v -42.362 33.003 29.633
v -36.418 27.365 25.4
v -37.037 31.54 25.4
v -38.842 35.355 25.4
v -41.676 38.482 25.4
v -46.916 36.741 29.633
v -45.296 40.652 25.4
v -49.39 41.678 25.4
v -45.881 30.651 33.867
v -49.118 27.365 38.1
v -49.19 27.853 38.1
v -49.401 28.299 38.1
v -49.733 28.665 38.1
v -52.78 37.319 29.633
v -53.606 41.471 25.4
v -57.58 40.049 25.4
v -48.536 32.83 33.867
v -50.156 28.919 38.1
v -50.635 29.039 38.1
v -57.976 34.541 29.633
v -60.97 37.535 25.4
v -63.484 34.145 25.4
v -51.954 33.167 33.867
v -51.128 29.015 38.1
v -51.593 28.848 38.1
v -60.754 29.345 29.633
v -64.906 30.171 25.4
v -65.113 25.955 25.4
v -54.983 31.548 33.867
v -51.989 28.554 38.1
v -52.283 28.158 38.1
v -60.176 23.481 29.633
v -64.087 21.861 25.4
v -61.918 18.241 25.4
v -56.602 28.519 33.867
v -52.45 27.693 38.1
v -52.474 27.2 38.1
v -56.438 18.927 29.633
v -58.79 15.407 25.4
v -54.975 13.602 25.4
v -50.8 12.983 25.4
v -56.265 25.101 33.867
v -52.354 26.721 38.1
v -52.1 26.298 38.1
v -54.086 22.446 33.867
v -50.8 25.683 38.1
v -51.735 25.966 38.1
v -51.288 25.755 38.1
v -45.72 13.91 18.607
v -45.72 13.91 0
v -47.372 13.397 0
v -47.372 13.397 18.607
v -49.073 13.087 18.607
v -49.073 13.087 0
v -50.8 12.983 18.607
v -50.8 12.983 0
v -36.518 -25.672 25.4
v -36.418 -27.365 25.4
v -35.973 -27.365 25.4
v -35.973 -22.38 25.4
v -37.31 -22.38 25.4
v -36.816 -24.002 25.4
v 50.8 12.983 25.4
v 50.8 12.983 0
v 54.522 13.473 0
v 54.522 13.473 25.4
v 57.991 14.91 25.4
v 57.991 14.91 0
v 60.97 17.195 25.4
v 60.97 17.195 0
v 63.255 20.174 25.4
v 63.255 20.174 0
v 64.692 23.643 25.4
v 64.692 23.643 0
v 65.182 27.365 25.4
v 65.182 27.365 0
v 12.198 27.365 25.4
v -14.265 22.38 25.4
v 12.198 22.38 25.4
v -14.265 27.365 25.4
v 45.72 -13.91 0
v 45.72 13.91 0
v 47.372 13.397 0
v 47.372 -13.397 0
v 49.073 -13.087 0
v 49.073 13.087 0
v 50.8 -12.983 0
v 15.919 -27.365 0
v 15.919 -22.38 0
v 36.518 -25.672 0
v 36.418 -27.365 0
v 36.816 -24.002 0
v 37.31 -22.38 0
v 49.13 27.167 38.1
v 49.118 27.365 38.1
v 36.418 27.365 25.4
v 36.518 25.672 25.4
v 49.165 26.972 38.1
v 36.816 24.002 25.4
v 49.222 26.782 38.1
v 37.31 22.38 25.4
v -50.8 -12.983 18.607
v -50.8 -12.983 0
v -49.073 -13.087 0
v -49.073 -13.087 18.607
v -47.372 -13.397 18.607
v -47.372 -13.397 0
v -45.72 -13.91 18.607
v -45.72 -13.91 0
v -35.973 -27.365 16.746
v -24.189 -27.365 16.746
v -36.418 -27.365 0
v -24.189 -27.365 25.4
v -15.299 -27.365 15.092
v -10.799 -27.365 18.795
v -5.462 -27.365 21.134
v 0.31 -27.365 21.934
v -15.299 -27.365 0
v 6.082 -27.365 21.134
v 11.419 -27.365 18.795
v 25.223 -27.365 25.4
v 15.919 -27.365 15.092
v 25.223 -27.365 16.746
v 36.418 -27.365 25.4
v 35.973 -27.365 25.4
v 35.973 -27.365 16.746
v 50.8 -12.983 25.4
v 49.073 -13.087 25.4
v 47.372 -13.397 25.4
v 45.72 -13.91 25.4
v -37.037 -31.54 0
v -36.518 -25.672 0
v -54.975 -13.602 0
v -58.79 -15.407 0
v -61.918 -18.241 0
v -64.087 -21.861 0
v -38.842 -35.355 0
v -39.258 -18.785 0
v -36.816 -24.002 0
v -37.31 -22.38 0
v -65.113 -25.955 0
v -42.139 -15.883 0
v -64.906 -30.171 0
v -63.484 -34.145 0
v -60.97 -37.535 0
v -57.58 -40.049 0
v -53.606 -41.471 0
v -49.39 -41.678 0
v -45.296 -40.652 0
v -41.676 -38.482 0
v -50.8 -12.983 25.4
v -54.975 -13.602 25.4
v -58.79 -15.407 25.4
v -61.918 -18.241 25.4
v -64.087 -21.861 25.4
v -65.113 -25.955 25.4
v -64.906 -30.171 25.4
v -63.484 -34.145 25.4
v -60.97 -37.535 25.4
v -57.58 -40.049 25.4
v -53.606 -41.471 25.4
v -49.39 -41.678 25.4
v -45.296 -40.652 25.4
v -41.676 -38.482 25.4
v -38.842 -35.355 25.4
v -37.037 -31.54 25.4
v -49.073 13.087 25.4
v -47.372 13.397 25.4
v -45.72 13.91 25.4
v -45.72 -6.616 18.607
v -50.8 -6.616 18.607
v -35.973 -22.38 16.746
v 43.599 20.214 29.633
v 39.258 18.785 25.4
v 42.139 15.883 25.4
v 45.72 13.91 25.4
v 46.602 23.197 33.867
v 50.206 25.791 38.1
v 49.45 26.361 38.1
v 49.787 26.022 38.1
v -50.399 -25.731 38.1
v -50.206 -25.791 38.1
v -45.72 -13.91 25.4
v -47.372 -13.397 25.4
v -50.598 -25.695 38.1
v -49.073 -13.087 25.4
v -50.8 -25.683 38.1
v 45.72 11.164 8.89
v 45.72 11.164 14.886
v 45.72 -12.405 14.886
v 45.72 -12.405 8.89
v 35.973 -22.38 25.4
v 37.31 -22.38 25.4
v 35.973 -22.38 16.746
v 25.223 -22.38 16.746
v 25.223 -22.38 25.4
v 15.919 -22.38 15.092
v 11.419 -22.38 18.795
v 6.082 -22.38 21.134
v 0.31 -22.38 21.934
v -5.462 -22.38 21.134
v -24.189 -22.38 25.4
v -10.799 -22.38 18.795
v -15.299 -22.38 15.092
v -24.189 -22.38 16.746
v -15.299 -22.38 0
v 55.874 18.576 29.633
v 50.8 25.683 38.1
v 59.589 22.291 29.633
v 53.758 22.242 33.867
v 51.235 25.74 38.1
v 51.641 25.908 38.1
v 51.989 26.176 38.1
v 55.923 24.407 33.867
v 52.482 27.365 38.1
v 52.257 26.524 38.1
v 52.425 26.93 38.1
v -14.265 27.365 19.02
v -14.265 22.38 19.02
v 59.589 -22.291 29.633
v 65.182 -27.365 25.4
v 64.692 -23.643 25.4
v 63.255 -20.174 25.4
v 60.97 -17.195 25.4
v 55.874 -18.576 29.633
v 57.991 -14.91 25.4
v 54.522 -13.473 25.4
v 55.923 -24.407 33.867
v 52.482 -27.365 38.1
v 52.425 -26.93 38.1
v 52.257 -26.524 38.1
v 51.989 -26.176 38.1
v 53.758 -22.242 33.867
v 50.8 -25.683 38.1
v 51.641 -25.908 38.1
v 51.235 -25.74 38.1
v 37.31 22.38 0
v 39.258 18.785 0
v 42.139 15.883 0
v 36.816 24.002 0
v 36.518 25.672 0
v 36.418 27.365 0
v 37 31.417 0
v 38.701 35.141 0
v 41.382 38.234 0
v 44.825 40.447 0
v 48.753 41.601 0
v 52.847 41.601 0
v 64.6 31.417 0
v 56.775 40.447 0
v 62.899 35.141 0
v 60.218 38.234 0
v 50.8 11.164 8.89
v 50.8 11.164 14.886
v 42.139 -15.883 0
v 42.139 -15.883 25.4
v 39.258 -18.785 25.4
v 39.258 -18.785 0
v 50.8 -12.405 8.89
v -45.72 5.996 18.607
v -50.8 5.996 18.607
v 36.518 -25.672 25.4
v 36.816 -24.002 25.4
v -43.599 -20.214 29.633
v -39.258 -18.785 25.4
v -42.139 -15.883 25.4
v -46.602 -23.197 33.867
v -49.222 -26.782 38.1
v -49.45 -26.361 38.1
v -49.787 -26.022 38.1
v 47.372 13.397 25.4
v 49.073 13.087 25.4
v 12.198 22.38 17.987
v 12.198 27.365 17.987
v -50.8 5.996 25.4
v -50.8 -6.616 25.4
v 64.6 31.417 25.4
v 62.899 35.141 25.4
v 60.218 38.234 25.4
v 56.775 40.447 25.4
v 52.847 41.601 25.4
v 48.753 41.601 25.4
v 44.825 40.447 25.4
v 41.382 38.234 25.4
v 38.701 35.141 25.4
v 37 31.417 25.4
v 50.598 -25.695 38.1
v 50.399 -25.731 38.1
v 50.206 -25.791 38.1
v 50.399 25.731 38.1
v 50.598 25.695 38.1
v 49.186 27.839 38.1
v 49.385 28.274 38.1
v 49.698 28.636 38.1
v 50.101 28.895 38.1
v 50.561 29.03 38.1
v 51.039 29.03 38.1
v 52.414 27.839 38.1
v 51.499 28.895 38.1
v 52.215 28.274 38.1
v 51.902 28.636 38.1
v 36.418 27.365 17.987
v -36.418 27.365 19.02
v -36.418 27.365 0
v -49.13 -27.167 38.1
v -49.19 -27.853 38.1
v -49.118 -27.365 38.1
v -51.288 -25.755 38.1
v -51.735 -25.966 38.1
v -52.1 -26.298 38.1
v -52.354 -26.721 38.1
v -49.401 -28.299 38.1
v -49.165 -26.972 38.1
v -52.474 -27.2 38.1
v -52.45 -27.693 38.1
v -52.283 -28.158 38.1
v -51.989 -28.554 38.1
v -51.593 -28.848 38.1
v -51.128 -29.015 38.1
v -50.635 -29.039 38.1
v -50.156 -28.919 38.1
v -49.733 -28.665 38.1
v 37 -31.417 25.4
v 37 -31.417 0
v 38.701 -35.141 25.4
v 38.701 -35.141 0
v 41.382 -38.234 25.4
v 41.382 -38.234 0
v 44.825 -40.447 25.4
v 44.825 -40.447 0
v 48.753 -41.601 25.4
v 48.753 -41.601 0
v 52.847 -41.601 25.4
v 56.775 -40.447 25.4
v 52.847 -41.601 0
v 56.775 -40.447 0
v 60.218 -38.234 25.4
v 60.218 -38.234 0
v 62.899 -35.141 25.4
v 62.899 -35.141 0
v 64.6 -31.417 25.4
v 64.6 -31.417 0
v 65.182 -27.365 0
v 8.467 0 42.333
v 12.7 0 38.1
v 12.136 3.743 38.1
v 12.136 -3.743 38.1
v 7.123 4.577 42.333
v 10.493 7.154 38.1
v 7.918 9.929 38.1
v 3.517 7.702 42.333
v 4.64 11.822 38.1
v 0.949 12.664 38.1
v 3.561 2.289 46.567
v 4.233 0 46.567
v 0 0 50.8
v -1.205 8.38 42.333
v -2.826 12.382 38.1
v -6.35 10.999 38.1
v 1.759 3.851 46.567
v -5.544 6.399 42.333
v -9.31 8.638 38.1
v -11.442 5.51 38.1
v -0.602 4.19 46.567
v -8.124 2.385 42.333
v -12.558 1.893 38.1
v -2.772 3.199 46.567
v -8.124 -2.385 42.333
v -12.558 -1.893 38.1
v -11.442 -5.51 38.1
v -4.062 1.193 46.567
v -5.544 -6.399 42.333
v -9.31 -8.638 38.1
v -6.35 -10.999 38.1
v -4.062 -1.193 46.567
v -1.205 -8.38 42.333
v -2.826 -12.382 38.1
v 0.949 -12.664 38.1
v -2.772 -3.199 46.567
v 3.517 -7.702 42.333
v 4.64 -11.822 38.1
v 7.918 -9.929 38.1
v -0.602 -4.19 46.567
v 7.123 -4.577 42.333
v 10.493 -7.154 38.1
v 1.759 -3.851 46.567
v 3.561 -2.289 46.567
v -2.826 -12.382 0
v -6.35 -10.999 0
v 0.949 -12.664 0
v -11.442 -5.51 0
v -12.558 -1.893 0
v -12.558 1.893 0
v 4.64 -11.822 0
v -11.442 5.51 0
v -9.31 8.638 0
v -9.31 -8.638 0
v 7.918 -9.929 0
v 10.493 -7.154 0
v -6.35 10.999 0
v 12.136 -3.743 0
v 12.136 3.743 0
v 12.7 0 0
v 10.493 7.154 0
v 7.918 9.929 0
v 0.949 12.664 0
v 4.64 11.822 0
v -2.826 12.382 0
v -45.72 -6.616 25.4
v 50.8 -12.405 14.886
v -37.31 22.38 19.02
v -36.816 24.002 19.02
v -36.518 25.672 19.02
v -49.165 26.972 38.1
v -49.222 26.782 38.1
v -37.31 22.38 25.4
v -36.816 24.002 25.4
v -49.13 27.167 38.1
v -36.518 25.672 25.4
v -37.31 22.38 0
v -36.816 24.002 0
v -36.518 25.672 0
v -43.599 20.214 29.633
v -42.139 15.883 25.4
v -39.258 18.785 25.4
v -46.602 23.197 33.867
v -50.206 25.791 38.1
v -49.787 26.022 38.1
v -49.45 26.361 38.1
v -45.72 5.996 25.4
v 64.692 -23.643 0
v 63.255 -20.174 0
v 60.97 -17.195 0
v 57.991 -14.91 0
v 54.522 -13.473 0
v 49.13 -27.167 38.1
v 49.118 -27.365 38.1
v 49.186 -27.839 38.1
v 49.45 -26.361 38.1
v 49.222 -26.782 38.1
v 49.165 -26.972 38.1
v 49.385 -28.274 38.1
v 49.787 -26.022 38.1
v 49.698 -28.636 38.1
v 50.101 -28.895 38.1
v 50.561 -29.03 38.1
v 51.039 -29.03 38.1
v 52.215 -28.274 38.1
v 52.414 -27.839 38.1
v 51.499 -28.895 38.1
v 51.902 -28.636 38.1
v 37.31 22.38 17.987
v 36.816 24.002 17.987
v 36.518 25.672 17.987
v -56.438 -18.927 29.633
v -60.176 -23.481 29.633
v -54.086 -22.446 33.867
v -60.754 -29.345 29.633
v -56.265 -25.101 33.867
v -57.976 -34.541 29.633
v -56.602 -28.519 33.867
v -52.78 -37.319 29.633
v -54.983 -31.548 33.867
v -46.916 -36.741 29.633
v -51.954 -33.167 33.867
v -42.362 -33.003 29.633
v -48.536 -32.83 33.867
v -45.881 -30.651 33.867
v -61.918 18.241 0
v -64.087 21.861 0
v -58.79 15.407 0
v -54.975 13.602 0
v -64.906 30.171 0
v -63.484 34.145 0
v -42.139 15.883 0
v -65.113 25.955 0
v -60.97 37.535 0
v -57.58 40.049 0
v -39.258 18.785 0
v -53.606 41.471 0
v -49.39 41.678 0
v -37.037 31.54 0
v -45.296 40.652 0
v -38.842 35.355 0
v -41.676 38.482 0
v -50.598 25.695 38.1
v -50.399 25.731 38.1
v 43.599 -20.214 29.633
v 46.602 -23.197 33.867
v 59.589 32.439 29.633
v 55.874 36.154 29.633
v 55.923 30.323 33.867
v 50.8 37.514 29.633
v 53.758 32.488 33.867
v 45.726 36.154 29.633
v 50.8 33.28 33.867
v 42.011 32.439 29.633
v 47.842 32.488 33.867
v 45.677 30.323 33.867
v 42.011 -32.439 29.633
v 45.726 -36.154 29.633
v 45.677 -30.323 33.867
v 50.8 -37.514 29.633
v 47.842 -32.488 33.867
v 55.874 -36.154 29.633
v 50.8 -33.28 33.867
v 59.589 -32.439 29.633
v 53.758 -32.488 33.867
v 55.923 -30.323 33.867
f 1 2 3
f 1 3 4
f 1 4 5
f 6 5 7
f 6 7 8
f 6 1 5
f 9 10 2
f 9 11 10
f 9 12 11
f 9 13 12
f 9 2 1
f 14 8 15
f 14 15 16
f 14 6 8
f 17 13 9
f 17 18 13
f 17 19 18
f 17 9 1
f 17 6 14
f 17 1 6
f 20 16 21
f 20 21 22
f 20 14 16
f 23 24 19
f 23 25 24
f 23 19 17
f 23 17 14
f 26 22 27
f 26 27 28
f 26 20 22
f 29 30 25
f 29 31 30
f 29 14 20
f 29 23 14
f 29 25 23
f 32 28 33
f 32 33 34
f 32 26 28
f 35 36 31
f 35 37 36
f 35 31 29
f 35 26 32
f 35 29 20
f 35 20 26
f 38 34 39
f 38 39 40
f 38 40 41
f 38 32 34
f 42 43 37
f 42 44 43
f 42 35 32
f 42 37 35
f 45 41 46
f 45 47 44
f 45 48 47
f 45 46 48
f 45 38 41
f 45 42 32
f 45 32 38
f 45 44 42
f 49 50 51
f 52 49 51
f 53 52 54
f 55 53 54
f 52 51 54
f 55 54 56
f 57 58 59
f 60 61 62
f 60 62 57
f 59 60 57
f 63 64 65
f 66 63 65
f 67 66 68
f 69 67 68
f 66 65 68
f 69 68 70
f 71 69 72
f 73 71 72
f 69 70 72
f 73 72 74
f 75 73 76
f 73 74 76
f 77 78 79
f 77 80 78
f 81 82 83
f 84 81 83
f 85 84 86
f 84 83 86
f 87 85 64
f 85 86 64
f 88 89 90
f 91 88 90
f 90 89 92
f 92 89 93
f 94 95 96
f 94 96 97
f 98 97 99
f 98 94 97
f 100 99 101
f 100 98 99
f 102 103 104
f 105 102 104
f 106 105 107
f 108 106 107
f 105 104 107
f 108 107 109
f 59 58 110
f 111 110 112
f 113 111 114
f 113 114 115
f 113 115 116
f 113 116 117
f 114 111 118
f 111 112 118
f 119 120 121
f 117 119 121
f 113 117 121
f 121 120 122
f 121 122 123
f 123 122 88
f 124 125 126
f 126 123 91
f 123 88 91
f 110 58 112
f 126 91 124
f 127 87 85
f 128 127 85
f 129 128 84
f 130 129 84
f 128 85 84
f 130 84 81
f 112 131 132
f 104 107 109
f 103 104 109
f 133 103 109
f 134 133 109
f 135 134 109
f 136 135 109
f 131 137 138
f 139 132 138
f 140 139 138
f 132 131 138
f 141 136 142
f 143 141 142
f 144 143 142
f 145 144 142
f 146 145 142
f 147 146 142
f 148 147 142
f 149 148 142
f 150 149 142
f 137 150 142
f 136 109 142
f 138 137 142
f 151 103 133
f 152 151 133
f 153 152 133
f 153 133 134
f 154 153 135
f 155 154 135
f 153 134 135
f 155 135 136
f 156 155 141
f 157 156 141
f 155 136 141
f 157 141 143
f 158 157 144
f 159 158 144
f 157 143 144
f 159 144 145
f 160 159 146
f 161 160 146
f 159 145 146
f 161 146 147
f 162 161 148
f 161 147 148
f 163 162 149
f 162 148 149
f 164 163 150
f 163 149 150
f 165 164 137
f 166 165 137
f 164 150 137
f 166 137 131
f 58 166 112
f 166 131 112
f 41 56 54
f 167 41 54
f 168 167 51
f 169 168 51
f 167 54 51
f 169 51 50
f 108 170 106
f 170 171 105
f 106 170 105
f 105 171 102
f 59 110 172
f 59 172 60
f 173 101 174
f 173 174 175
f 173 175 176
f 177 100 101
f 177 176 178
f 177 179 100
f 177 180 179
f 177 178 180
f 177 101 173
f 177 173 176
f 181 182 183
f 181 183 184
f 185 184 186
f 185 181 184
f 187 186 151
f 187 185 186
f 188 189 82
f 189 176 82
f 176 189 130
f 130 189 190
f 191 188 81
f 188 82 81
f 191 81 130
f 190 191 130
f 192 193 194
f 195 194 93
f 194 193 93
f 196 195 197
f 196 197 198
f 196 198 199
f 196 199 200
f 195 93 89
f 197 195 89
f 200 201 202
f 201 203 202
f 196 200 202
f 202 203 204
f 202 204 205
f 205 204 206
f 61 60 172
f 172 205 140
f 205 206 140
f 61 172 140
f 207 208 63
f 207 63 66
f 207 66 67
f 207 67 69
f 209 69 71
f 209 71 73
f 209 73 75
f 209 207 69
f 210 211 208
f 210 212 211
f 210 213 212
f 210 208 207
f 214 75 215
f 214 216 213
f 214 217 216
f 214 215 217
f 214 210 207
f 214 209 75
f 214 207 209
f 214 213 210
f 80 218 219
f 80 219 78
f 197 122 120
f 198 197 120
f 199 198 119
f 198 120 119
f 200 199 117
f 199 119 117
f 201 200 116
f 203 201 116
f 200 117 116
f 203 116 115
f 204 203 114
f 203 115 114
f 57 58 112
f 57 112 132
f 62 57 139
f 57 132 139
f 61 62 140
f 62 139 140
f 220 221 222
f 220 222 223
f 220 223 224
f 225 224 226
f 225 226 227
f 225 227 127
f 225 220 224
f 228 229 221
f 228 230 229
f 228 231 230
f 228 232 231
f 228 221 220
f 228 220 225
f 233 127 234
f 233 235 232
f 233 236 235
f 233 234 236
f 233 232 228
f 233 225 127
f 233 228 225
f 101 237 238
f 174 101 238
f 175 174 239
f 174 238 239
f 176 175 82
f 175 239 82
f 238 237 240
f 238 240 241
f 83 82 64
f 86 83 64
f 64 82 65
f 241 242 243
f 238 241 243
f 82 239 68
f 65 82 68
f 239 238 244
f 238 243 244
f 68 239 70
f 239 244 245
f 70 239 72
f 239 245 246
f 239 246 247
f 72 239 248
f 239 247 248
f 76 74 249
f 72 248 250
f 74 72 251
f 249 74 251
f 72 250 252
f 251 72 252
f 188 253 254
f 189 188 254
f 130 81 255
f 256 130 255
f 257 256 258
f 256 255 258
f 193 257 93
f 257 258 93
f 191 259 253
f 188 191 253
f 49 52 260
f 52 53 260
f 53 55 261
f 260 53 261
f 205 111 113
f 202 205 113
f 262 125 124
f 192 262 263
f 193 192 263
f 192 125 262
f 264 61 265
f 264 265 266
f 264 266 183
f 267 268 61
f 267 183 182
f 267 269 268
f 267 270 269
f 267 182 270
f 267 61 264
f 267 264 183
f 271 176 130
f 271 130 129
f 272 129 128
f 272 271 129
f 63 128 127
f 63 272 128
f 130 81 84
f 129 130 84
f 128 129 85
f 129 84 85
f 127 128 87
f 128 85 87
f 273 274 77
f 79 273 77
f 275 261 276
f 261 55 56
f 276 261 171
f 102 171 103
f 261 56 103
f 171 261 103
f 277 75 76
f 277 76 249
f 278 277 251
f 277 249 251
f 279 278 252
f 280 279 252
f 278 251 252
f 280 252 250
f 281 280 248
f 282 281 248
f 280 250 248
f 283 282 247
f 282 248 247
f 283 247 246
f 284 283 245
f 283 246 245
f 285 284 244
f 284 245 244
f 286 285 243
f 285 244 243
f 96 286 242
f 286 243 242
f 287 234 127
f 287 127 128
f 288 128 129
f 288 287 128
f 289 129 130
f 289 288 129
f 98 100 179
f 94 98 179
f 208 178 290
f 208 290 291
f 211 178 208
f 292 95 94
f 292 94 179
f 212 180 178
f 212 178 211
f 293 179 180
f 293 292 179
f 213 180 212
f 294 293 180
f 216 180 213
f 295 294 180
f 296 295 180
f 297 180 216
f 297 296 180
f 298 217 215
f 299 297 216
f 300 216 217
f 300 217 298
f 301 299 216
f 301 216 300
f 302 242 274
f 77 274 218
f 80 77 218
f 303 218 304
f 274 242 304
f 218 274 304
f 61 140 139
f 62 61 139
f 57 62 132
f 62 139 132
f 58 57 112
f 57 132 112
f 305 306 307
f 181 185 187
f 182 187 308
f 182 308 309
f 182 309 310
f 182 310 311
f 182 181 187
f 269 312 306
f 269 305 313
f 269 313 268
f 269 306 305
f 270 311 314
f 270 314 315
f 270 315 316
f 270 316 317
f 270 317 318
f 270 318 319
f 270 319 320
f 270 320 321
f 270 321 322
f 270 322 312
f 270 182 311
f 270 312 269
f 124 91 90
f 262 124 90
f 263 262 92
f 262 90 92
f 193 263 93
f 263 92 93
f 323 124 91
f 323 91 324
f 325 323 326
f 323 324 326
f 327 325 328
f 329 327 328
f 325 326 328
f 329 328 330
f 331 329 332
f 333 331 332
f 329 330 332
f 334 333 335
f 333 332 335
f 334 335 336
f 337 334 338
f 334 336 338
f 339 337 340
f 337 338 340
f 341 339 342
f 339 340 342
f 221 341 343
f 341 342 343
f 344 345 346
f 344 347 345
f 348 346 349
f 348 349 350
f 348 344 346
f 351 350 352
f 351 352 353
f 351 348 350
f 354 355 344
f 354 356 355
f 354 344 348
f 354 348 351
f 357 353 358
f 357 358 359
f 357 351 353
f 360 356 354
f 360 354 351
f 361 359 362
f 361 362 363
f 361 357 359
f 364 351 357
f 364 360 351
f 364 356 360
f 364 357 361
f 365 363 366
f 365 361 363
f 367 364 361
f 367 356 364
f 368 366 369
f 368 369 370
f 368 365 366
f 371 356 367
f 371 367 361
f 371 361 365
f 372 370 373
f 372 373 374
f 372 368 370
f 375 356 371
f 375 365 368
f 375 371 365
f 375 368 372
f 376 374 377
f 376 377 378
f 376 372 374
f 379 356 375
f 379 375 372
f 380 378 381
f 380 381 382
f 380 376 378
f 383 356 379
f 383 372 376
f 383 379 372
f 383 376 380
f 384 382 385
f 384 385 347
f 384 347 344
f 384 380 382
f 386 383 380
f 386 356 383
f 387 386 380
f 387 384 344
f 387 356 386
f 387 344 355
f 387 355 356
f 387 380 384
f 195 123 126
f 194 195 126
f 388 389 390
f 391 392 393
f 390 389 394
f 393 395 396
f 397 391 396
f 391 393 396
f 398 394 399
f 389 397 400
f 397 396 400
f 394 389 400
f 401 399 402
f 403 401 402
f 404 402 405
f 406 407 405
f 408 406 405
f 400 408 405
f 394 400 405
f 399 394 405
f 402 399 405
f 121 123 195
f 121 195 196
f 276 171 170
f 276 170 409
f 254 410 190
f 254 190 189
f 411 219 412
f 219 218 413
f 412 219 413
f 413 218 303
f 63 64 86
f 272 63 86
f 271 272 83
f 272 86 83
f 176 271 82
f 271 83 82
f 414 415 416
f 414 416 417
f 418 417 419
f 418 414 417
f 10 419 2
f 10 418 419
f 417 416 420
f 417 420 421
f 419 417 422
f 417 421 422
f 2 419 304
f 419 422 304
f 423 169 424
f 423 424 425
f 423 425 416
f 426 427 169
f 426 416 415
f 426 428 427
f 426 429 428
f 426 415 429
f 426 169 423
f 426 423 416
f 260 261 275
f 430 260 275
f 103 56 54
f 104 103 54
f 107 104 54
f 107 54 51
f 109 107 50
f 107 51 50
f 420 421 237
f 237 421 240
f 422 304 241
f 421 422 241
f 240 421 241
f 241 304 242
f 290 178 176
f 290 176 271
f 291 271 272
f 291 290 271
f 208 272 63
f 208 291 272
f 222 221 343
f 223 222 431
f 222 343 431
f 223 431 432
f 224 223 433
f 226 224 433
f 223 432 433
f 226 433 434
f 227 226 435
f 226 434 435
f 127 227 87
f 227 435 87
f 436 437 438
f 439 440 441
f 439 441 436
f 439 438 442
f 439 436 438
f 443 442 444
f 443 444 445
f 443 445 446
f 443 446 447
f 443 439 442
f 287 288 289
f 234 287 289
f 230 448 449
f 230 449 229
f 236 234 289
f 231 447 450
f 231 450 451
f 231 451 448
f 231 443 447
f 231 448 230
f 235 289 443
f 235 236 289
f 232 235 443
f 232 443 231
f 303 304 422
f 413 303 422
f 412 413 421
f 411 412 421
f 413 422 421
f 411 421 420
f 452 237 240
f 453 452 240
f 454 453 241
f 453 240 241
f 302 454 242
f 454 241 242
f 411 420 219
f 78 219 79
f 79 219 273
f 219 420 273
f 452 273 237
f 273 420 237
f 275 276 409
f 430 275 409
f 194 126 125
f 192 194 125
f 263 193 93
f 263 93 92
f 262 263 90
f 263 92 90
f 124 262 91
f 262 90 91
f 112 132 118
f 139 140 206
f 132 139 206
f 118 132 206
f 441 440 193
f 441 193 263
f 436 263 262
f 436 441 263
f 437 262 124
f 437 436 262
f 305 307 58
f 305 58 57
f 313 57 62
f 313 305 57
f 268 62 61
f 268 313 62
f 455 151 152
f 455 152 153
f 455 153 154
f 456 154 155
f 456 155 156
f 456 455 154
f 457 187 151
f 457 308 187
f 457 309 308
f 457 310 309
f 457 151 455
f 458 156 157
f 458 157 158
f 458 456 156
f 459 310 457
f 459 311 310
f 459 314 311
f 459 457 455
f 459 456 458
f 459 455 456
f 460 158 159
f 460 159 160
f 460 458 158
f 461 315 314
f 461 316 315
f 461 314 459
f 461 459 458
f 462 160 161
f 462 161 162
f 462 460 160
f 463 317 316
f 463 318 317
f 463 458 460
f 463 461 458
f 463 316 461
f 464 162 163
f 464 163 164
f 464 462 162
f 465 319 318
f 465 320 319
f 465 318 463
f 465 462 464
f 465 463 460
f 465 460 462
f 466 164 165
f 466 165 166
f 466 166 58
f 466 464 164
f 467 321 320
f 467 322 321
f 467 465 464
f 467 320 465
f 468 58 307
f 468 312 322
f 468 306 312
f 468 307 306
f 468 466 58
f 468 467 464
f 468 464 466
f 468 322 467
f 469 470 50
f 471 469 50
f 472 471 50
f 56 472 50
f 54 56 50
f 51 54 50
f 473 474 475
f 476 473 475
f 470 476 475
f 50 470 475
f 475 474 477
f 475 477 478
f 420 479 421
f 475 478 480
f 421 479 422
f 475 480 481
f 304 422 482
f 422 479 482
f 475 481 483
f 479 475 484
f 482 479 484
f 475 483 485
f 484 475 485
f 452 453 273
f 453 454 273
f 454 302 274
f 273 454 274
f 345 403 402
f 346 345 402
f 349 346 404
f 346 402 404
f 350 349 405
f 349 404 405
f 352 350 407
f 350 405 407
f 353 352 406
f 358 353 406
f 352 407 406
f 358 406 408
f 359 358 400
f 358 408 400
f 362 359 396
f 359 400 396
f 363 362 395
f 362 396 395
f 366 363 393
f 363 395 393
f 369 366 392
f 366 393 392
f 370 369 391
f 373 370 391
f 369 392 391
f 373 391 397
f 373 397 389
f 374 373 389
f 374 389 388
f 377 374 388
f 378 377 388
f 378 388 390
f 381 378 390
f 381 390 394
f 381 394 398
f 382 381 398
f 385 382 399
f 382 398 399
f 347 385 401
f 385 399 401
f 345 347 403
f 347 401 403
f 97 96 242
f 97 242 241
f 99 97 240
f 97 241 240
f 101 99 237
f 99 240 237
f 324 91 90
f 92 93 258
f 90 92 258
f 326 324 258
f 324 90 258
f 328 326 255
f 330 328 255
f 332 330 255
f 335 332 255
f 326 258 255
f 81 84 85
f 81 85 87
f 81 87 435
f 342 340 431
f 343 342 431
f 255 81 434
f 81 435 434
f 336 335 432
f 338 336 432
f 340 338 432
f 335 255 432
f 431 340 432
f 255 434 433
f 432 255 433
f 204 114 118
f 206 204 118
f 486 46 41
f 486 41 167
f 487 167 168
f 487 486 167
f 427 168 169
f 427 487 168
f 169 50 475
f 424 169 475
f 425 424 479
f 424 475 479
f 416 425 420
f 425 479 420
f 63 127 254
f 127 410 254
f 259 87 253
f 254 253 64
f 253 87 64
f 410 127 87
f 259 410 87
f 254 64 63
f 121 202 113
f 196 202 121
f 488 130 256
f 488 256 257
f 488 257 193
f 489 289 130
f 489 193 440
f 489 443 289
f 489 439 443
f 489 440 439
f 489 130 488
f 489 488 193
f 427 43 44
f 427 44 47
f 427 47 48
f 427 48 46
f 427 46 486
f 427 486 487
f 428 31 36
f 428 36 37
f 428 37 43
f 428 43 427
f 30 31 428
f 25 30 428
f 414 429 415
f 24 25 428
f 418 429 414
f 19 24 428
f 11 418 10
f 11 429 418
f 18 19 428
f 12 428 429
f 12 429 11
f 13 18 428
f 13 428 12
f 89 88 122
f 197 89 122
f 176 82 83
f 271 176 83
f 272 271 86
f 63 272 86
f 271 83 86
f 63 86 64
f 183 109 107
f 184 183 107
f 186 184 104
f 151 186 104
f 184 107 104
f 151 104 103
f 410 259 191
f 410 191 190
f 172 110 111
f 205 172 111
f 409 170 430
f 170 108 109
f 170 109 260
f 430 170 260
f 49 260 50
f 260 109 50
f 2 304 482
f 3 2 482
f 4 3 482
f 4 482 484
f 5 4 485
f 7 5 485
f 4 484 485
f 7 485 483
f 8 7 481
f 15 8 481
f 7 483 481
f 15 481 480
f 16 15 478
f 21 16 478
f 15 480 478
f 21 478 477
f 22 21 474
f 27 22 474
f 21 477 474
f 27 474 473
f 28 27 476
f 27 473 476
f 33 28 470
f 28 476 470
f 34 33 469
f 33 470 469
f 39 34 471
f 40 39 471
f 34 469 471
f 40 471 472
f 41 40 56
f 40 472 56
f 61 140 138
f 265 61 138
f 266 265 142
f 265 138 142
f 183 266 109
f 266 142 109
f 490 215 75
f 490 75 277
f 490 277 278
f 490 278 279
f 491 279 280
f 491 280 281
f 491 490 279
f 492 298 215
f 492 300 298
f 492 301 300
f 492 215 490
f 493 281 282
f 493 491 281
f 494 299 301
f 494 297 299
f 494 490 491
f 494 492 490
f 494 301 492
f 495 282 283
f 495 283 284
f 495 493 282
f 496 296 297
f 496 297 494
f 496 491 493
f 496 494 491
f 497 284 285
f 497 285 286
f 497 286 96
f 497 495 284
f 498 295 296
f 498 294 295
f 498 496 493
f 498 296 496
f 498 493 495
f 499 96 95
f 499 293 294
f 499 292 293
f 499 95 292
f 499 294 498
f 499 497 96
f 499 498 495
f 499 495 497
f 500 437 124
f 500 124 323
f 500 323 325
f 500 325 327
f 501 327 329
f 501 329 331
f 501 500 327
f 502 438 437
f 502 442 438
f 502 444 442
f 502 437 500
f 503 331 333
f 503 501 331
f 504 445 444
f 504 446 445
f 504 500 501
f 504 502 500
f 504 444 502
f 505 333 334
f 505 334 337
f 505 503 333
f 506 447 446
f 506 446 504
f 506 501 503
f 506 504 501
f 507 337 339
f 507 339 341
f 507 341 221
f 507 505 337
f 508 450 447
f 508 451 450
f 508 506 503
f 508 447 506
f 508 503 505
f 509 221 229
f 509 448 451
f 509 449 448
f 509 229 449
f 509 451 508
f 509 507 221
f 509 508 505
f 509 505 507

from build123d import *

# Parameters (mm, degrees)
F1_DEPTH   = 25.4
F2_DEPTH   = 38.1
F0_R       = 12.7
F3_DEPTH   = 50.8
F5_DEPTH   = 25.4
F4_W       = 11.7844194174
F4_H       = 8.6537211478
F4_W_2     = 10.750696063
F6_DEPTH   = 25.4
F7_W       = 1.4892533321
F7_H       = 6.7930224627
F7_W_2     = 6.9872582432
F7_W_3     = 6.3670262795
F7_W_4     = 2.1094843645
F8_DEPTH   = 25.4
F9_W       = 23.5688369721
F9_H       = 5.9955809265
F10_DEPTH  = 25.4
F11_W      = 1.8297875876
F11_H      = 7.4132553577
F11_W_2    = 24.2199800333
F11_W_3    = 22.1525379812
F11_H_2    = 6.3795357287
F11_W_4    = 3.6904881353
F12_DEPTH  = 25.4
F13_SIZE   = 12.7
F14_SIZE   = 12.7
F14_2_SIZE = 12.7
F14_3_SIZE = 12.7
F14_4_SIZE = 12.7


with BuildPart() as f1:
    # F0 (on Top) → F1 (new body)
    with BuildSketch(Plane.XY):
        with BuildLine():
            ThreePointArc((37.3095583182, 22.3796591884), (36.6425597983, 24.8327488181), (36.417887116, 27.364952985))
            Line((36.417887116, 27.364952985), (-36.417887116, 27.364952985))
            ThreePointArc((-36.417887116, 27.364952985), (-36.6425597983, 24.8327488181), (-37.3095583182, 22.3796591884))
            Line((-37.3095583182, 22.3796591884), (37.3095583182, 22.3796591884))
        make_face()
    extrude(amount=F1_DEPTH)

    # F11 (on face) → F12 (cut)
    with BuildSketch(Plane(origin=(0, 27.364952985, 0), x_dir=(-1, 0, 0), z_dir=(0, 1, 0))):
        with Locations((-37.3327809098, 21.6933723211)):
            Rectangle(F11_W, F11_H)
        with Locations((-24.3078970994, 21.6933723211)):
            Rectangle(F11_W_2, F11_H)
        with Locations((25.3416181254, 22.2102321357)):
            Rectangle(F11_W_3, F11_H_2)
        with Locations((38.2631311837, 22.2102321357)):
            Rectangle(F11_W_4, F11_H_2)
    extrude(amount=-F12_DEPTH, mode=Mode.SUBTRACT)


with BuildPart() as f1b:
    # F0 (on Top) → F1, piece 2 (new body)
    with BuildSketch(Plane.XY):
        with BuildLine():
            ThreePointArc((-45.72, 13.909888102), (-48.2180521889, 13.2165001894), (-50.8, 12.982840101))
            Line((-50.8, 12.982840101), (-50.8, -12.982840101))
            ThreePointArc((-50.8, -12.982840101), (-48.2180521889, -13.2165001894), (-45.72, -13.909888102))
            Line((-45.72, -13.909888102), (-45.72, 13.909888102))
        make_face()
    extrude(amount=F1_DEPTH)

    # F7 (on face) → F8 (cut)
    with BuildSketch(Plane(origin=(-50.8, 0, 0), x_dir=(0, -1, 0), z_dir=(-1, 0, 0))):
        with Locations((-13.7274667671, 22.0034887686)):
            Rectangle(F7_W, F7_H)
        with Locations((-9.4892109794, 22.0034887686)):
            Rectangle(F7_W_2, F7_H)
        with Locations((9.7993269613, 22.0034887686)):
            Rectangle(F7_W_3, F7_H)
        with Locations((14.0375822833, 22.0034887686)):
            Rectangle(F7_W_4, F7_H)
    extrude(amount=-F8_DEPTH, mode=Mode.SUBTRACT)


with BuildPart() as f1c:
    # F0 (on Top) → F1, piece 3 (new body)
    with BuildSketch(Plane.XY):
        with BuildLine():
            Line((50.8, -12.982840101), (50.8, 12.982840101))
            ThreePointArc((50.8, 12.982840101), (48.2180521889, 13.2165001894), (45.72, 13.909888102))
            Line((45.72, 13.909888102), (45.72, -13.909888102))
            ThreePointArc((45.72, -13.909888102), (48.2180521889, -13.2165001894), (50.8, -12.982840101))
        make_face()
    extrude(amount=F1_DEPTH)

    # F9 (on face) → F10 (cut)
    with BuildSketch(Plane.YZ.offset(50.8)):
        with Locations((-0.620232895, 11.8877906352)):
            Rectangle(F9_W, F9_H)
    extrude(amount=-F10_DEPTH, mode=Mode.SUBTRACT)


with BuildPart() as f1d:
    # F0 (on Top) → F1, piece 4 (new body)
    with BuildSketch(Plane.XY):
        with BuildLine():
            ThreePointArc((-37.3095583182, -22.3796591884), (-36.6425597983, -24.8327488181), (-36.417887116, -27.364952985))
            Line((-36.417887116, -27.364952985), (36.417887116, -27.364952985))
            ThreePointArc((36.417887116, -27.364952985), (36.6425597983, -24.8327488181), (37.3095583182, -22.3796591884))
            Line((37.3095583182, -22.3796591884), (-37.3095583182, -22.3796591884))
        make_face()
    extrude(amount=F1_DEPTH)

    # F4 (on face) → F5 (cut)
    with BuildSketch(Plane.XZ.offset(27.364952985)):
        with BuildLine():
            Line((-15.2990696952, 15.0923253968), (-15.2990696952, 0))
            Line((-15.2990696952, 0), (15.9193035215, 0))
            Line((15.9193035215, 0), (15.9193035215, 15.0923253968))
            ThreePointArc((15.9193035215, 15.0923253968), (0.3101169132, 21.9341960604), (-15.2990696952, 15.0923253968))
        make_face()
    extrude(amount=-F5_DEPTH, mode=Mode.SUBTRACT)

    # F4 (on face) → F6 (cut)
    with BuildSketch(Plane.XZ.offset(27.364952985)):
        with Locations((-30.0812795758, 21.0731394261)):
            Rectangle(F4_W, F4_H)
        with Locations((30.598141253, 21.0731394261)):
            Rectangle(F4_W_2, F4_H)
    extrude(amount=-F6_DEPTH, mode=Mode.SUBTRACT)


with BuildPart() as f2:
    # F0 (on Top) → F2 (new body)
    with BuildSketch(Plane.XY):
        with BuildLine():
            ThreePointArc((-37.3095583182, 22.3796591884), (-36.6425597983, 24.8327488181), (-36.417887116, 27.364952985))
            ThreePointArc((-36.417887116, 27.364952985), (-60.969689548, 37.534642533), (-50.8, 12.982840101))
            ThreePointArc((-50.8, 12.982840101), (-48.2180521889, 13.2165001894), (-45.72, 13.909888102))
            ThreePointArc((-45.72, 13.909888102), (-40.5946297653, 17.2310697521), (-37.3095583182, 22.3796591884))
        make_face()
    extrude(amount=F2_DEPTH)

    # F14
    f14_edges = [f2.edges().sort_by_distance(p)[0] for p in [
        (-50.8, 41.747066, 38.1),
    ]]
    chamfer(f14_edges, length=F14_SIZE)


with BuildPart() as f2b:
    # F0 (on Top) → F2, piece 2 (new body)
    with BuildSketch(Plane.XY):
        with BuildLine():
            ThreePointArc((65.182112884, 27.364952985), (50.8, 41.747065869), (36.417887116, 27.364952985))
            ThreePointArc((36.417887116, 27.364952985), (36.6425597983, 24.8327488181), (37.3095583182, 22.3796591884))
            ThreePointArc((37.3095583182, 22.3796591884), (40.5946297653, 17.2310697521), (45.72, 13.909888102))
            ThreePointArc((45.72, 13.909888102), (48.2180521889, 13.2165001894), (50.8, 12.982840101))
            ThreePointArc((50.8, 12.982840101), (60.969689548, 17.195263437), (65.182112884, 27.364952985))
        make_face()
    extrude(amount=F2_DEPTH)

    # F14#2
    f14_2_edges = [f2b.edges().sort_by_distance(p)[0] for p in [
        (65.182113, 27.364953, 38.1),
    ]]
    chamfer(f14_2_edges, length=F14_2_SIZE)


with BuildPart() as f2c:
    # F0 (on Top) → F2, piece 3 (new body)
    with BuildSketch(Plane.XY):
        with BuildLine():
            ThreePointArc((65.182112884, -27.364952985), (60.969689548, -17.195263437), (50.8, -12.982840101))
            ThreePointArc((50.8, -12.982840101), (48.2180521889, -13.2165001894), (45.72, -13.909888102))
            ThreePointArc((45.72, -13.909888102), (40.5946297653, -17.2310697521), (37.3095583182, -22.3796591884))
            ThreePointArc((37.3095583182, -22.3796591884), (36.6425597983, -24.8327488181), (36.417887116, -27.364952985))
            ThreePointArc((36.417887116, -27.364952985), (50.8, -41.747065869), (65.182112884, -27.364952985))
        make_face()
    extrude(amount=F2_DEPTH)

    # F14#3
    f14_3_edges = [f2c.edges().sort_by_distance(p)[0] for p in [
        (36.417887, -27.364953, 38.1),
    ]]
    chamfer(f14_3_edges, length=F14_3_SIZE)


with BuildPart() as f2d:
    # F0 (on Top) → F2, piece 4 (new body)
    with BuildSketch(Plane.XY):
        with BuildLine():
            ThreePointArc((-45.72, -13.909888102), (-48.2180521889, -13.2165001894), (-50.8, -12.982840101))
            ThreePointArc((-50.8, -12.982840101), (-60.969689548, -37.534642533), (-36.417887116, -27.364952985))
            ThreePointArc((-36.417887116, -27.364952985), (-36.6425597983, -24.8327488181), (-37.3095583182, -22.3796591884))
            ThreePointArc((-37.3095583182, -22.3796591884), (-40.5946297653, -17.2310697521), (-45.72, -13.909888102))
        make_face()
    extrude(amount=F2_DEPTH)

    # F14#4
    f14_4_edges = [f2d.edges().sort_by_distance(p)[0] for p in [
        (-65.182113, -27.364953, 38.1),
    ]]
    chamfer(f14_4_edges, length=F14_4_SIZE)


with BuildPart() as f3:
    # F0 (on Top) → F3 (new body)
    with BuildSketch(Plane.XY):
        Circle(F0_R)
    extrude(amount=F3_DEPTH)

    # F13
    f13_edges = [f3.edges().sort_by_distance(p)[0] for p in [
        (-12.7, 0, 50.8),
    ]]
    chamfer(f13_edges, length=F13_SIZE)


solid = Compound([f1.part, f1b.part, f1c.part, f1d.part, f2.part, f2b.part, f2c.part, f2d.part, f3.part])
